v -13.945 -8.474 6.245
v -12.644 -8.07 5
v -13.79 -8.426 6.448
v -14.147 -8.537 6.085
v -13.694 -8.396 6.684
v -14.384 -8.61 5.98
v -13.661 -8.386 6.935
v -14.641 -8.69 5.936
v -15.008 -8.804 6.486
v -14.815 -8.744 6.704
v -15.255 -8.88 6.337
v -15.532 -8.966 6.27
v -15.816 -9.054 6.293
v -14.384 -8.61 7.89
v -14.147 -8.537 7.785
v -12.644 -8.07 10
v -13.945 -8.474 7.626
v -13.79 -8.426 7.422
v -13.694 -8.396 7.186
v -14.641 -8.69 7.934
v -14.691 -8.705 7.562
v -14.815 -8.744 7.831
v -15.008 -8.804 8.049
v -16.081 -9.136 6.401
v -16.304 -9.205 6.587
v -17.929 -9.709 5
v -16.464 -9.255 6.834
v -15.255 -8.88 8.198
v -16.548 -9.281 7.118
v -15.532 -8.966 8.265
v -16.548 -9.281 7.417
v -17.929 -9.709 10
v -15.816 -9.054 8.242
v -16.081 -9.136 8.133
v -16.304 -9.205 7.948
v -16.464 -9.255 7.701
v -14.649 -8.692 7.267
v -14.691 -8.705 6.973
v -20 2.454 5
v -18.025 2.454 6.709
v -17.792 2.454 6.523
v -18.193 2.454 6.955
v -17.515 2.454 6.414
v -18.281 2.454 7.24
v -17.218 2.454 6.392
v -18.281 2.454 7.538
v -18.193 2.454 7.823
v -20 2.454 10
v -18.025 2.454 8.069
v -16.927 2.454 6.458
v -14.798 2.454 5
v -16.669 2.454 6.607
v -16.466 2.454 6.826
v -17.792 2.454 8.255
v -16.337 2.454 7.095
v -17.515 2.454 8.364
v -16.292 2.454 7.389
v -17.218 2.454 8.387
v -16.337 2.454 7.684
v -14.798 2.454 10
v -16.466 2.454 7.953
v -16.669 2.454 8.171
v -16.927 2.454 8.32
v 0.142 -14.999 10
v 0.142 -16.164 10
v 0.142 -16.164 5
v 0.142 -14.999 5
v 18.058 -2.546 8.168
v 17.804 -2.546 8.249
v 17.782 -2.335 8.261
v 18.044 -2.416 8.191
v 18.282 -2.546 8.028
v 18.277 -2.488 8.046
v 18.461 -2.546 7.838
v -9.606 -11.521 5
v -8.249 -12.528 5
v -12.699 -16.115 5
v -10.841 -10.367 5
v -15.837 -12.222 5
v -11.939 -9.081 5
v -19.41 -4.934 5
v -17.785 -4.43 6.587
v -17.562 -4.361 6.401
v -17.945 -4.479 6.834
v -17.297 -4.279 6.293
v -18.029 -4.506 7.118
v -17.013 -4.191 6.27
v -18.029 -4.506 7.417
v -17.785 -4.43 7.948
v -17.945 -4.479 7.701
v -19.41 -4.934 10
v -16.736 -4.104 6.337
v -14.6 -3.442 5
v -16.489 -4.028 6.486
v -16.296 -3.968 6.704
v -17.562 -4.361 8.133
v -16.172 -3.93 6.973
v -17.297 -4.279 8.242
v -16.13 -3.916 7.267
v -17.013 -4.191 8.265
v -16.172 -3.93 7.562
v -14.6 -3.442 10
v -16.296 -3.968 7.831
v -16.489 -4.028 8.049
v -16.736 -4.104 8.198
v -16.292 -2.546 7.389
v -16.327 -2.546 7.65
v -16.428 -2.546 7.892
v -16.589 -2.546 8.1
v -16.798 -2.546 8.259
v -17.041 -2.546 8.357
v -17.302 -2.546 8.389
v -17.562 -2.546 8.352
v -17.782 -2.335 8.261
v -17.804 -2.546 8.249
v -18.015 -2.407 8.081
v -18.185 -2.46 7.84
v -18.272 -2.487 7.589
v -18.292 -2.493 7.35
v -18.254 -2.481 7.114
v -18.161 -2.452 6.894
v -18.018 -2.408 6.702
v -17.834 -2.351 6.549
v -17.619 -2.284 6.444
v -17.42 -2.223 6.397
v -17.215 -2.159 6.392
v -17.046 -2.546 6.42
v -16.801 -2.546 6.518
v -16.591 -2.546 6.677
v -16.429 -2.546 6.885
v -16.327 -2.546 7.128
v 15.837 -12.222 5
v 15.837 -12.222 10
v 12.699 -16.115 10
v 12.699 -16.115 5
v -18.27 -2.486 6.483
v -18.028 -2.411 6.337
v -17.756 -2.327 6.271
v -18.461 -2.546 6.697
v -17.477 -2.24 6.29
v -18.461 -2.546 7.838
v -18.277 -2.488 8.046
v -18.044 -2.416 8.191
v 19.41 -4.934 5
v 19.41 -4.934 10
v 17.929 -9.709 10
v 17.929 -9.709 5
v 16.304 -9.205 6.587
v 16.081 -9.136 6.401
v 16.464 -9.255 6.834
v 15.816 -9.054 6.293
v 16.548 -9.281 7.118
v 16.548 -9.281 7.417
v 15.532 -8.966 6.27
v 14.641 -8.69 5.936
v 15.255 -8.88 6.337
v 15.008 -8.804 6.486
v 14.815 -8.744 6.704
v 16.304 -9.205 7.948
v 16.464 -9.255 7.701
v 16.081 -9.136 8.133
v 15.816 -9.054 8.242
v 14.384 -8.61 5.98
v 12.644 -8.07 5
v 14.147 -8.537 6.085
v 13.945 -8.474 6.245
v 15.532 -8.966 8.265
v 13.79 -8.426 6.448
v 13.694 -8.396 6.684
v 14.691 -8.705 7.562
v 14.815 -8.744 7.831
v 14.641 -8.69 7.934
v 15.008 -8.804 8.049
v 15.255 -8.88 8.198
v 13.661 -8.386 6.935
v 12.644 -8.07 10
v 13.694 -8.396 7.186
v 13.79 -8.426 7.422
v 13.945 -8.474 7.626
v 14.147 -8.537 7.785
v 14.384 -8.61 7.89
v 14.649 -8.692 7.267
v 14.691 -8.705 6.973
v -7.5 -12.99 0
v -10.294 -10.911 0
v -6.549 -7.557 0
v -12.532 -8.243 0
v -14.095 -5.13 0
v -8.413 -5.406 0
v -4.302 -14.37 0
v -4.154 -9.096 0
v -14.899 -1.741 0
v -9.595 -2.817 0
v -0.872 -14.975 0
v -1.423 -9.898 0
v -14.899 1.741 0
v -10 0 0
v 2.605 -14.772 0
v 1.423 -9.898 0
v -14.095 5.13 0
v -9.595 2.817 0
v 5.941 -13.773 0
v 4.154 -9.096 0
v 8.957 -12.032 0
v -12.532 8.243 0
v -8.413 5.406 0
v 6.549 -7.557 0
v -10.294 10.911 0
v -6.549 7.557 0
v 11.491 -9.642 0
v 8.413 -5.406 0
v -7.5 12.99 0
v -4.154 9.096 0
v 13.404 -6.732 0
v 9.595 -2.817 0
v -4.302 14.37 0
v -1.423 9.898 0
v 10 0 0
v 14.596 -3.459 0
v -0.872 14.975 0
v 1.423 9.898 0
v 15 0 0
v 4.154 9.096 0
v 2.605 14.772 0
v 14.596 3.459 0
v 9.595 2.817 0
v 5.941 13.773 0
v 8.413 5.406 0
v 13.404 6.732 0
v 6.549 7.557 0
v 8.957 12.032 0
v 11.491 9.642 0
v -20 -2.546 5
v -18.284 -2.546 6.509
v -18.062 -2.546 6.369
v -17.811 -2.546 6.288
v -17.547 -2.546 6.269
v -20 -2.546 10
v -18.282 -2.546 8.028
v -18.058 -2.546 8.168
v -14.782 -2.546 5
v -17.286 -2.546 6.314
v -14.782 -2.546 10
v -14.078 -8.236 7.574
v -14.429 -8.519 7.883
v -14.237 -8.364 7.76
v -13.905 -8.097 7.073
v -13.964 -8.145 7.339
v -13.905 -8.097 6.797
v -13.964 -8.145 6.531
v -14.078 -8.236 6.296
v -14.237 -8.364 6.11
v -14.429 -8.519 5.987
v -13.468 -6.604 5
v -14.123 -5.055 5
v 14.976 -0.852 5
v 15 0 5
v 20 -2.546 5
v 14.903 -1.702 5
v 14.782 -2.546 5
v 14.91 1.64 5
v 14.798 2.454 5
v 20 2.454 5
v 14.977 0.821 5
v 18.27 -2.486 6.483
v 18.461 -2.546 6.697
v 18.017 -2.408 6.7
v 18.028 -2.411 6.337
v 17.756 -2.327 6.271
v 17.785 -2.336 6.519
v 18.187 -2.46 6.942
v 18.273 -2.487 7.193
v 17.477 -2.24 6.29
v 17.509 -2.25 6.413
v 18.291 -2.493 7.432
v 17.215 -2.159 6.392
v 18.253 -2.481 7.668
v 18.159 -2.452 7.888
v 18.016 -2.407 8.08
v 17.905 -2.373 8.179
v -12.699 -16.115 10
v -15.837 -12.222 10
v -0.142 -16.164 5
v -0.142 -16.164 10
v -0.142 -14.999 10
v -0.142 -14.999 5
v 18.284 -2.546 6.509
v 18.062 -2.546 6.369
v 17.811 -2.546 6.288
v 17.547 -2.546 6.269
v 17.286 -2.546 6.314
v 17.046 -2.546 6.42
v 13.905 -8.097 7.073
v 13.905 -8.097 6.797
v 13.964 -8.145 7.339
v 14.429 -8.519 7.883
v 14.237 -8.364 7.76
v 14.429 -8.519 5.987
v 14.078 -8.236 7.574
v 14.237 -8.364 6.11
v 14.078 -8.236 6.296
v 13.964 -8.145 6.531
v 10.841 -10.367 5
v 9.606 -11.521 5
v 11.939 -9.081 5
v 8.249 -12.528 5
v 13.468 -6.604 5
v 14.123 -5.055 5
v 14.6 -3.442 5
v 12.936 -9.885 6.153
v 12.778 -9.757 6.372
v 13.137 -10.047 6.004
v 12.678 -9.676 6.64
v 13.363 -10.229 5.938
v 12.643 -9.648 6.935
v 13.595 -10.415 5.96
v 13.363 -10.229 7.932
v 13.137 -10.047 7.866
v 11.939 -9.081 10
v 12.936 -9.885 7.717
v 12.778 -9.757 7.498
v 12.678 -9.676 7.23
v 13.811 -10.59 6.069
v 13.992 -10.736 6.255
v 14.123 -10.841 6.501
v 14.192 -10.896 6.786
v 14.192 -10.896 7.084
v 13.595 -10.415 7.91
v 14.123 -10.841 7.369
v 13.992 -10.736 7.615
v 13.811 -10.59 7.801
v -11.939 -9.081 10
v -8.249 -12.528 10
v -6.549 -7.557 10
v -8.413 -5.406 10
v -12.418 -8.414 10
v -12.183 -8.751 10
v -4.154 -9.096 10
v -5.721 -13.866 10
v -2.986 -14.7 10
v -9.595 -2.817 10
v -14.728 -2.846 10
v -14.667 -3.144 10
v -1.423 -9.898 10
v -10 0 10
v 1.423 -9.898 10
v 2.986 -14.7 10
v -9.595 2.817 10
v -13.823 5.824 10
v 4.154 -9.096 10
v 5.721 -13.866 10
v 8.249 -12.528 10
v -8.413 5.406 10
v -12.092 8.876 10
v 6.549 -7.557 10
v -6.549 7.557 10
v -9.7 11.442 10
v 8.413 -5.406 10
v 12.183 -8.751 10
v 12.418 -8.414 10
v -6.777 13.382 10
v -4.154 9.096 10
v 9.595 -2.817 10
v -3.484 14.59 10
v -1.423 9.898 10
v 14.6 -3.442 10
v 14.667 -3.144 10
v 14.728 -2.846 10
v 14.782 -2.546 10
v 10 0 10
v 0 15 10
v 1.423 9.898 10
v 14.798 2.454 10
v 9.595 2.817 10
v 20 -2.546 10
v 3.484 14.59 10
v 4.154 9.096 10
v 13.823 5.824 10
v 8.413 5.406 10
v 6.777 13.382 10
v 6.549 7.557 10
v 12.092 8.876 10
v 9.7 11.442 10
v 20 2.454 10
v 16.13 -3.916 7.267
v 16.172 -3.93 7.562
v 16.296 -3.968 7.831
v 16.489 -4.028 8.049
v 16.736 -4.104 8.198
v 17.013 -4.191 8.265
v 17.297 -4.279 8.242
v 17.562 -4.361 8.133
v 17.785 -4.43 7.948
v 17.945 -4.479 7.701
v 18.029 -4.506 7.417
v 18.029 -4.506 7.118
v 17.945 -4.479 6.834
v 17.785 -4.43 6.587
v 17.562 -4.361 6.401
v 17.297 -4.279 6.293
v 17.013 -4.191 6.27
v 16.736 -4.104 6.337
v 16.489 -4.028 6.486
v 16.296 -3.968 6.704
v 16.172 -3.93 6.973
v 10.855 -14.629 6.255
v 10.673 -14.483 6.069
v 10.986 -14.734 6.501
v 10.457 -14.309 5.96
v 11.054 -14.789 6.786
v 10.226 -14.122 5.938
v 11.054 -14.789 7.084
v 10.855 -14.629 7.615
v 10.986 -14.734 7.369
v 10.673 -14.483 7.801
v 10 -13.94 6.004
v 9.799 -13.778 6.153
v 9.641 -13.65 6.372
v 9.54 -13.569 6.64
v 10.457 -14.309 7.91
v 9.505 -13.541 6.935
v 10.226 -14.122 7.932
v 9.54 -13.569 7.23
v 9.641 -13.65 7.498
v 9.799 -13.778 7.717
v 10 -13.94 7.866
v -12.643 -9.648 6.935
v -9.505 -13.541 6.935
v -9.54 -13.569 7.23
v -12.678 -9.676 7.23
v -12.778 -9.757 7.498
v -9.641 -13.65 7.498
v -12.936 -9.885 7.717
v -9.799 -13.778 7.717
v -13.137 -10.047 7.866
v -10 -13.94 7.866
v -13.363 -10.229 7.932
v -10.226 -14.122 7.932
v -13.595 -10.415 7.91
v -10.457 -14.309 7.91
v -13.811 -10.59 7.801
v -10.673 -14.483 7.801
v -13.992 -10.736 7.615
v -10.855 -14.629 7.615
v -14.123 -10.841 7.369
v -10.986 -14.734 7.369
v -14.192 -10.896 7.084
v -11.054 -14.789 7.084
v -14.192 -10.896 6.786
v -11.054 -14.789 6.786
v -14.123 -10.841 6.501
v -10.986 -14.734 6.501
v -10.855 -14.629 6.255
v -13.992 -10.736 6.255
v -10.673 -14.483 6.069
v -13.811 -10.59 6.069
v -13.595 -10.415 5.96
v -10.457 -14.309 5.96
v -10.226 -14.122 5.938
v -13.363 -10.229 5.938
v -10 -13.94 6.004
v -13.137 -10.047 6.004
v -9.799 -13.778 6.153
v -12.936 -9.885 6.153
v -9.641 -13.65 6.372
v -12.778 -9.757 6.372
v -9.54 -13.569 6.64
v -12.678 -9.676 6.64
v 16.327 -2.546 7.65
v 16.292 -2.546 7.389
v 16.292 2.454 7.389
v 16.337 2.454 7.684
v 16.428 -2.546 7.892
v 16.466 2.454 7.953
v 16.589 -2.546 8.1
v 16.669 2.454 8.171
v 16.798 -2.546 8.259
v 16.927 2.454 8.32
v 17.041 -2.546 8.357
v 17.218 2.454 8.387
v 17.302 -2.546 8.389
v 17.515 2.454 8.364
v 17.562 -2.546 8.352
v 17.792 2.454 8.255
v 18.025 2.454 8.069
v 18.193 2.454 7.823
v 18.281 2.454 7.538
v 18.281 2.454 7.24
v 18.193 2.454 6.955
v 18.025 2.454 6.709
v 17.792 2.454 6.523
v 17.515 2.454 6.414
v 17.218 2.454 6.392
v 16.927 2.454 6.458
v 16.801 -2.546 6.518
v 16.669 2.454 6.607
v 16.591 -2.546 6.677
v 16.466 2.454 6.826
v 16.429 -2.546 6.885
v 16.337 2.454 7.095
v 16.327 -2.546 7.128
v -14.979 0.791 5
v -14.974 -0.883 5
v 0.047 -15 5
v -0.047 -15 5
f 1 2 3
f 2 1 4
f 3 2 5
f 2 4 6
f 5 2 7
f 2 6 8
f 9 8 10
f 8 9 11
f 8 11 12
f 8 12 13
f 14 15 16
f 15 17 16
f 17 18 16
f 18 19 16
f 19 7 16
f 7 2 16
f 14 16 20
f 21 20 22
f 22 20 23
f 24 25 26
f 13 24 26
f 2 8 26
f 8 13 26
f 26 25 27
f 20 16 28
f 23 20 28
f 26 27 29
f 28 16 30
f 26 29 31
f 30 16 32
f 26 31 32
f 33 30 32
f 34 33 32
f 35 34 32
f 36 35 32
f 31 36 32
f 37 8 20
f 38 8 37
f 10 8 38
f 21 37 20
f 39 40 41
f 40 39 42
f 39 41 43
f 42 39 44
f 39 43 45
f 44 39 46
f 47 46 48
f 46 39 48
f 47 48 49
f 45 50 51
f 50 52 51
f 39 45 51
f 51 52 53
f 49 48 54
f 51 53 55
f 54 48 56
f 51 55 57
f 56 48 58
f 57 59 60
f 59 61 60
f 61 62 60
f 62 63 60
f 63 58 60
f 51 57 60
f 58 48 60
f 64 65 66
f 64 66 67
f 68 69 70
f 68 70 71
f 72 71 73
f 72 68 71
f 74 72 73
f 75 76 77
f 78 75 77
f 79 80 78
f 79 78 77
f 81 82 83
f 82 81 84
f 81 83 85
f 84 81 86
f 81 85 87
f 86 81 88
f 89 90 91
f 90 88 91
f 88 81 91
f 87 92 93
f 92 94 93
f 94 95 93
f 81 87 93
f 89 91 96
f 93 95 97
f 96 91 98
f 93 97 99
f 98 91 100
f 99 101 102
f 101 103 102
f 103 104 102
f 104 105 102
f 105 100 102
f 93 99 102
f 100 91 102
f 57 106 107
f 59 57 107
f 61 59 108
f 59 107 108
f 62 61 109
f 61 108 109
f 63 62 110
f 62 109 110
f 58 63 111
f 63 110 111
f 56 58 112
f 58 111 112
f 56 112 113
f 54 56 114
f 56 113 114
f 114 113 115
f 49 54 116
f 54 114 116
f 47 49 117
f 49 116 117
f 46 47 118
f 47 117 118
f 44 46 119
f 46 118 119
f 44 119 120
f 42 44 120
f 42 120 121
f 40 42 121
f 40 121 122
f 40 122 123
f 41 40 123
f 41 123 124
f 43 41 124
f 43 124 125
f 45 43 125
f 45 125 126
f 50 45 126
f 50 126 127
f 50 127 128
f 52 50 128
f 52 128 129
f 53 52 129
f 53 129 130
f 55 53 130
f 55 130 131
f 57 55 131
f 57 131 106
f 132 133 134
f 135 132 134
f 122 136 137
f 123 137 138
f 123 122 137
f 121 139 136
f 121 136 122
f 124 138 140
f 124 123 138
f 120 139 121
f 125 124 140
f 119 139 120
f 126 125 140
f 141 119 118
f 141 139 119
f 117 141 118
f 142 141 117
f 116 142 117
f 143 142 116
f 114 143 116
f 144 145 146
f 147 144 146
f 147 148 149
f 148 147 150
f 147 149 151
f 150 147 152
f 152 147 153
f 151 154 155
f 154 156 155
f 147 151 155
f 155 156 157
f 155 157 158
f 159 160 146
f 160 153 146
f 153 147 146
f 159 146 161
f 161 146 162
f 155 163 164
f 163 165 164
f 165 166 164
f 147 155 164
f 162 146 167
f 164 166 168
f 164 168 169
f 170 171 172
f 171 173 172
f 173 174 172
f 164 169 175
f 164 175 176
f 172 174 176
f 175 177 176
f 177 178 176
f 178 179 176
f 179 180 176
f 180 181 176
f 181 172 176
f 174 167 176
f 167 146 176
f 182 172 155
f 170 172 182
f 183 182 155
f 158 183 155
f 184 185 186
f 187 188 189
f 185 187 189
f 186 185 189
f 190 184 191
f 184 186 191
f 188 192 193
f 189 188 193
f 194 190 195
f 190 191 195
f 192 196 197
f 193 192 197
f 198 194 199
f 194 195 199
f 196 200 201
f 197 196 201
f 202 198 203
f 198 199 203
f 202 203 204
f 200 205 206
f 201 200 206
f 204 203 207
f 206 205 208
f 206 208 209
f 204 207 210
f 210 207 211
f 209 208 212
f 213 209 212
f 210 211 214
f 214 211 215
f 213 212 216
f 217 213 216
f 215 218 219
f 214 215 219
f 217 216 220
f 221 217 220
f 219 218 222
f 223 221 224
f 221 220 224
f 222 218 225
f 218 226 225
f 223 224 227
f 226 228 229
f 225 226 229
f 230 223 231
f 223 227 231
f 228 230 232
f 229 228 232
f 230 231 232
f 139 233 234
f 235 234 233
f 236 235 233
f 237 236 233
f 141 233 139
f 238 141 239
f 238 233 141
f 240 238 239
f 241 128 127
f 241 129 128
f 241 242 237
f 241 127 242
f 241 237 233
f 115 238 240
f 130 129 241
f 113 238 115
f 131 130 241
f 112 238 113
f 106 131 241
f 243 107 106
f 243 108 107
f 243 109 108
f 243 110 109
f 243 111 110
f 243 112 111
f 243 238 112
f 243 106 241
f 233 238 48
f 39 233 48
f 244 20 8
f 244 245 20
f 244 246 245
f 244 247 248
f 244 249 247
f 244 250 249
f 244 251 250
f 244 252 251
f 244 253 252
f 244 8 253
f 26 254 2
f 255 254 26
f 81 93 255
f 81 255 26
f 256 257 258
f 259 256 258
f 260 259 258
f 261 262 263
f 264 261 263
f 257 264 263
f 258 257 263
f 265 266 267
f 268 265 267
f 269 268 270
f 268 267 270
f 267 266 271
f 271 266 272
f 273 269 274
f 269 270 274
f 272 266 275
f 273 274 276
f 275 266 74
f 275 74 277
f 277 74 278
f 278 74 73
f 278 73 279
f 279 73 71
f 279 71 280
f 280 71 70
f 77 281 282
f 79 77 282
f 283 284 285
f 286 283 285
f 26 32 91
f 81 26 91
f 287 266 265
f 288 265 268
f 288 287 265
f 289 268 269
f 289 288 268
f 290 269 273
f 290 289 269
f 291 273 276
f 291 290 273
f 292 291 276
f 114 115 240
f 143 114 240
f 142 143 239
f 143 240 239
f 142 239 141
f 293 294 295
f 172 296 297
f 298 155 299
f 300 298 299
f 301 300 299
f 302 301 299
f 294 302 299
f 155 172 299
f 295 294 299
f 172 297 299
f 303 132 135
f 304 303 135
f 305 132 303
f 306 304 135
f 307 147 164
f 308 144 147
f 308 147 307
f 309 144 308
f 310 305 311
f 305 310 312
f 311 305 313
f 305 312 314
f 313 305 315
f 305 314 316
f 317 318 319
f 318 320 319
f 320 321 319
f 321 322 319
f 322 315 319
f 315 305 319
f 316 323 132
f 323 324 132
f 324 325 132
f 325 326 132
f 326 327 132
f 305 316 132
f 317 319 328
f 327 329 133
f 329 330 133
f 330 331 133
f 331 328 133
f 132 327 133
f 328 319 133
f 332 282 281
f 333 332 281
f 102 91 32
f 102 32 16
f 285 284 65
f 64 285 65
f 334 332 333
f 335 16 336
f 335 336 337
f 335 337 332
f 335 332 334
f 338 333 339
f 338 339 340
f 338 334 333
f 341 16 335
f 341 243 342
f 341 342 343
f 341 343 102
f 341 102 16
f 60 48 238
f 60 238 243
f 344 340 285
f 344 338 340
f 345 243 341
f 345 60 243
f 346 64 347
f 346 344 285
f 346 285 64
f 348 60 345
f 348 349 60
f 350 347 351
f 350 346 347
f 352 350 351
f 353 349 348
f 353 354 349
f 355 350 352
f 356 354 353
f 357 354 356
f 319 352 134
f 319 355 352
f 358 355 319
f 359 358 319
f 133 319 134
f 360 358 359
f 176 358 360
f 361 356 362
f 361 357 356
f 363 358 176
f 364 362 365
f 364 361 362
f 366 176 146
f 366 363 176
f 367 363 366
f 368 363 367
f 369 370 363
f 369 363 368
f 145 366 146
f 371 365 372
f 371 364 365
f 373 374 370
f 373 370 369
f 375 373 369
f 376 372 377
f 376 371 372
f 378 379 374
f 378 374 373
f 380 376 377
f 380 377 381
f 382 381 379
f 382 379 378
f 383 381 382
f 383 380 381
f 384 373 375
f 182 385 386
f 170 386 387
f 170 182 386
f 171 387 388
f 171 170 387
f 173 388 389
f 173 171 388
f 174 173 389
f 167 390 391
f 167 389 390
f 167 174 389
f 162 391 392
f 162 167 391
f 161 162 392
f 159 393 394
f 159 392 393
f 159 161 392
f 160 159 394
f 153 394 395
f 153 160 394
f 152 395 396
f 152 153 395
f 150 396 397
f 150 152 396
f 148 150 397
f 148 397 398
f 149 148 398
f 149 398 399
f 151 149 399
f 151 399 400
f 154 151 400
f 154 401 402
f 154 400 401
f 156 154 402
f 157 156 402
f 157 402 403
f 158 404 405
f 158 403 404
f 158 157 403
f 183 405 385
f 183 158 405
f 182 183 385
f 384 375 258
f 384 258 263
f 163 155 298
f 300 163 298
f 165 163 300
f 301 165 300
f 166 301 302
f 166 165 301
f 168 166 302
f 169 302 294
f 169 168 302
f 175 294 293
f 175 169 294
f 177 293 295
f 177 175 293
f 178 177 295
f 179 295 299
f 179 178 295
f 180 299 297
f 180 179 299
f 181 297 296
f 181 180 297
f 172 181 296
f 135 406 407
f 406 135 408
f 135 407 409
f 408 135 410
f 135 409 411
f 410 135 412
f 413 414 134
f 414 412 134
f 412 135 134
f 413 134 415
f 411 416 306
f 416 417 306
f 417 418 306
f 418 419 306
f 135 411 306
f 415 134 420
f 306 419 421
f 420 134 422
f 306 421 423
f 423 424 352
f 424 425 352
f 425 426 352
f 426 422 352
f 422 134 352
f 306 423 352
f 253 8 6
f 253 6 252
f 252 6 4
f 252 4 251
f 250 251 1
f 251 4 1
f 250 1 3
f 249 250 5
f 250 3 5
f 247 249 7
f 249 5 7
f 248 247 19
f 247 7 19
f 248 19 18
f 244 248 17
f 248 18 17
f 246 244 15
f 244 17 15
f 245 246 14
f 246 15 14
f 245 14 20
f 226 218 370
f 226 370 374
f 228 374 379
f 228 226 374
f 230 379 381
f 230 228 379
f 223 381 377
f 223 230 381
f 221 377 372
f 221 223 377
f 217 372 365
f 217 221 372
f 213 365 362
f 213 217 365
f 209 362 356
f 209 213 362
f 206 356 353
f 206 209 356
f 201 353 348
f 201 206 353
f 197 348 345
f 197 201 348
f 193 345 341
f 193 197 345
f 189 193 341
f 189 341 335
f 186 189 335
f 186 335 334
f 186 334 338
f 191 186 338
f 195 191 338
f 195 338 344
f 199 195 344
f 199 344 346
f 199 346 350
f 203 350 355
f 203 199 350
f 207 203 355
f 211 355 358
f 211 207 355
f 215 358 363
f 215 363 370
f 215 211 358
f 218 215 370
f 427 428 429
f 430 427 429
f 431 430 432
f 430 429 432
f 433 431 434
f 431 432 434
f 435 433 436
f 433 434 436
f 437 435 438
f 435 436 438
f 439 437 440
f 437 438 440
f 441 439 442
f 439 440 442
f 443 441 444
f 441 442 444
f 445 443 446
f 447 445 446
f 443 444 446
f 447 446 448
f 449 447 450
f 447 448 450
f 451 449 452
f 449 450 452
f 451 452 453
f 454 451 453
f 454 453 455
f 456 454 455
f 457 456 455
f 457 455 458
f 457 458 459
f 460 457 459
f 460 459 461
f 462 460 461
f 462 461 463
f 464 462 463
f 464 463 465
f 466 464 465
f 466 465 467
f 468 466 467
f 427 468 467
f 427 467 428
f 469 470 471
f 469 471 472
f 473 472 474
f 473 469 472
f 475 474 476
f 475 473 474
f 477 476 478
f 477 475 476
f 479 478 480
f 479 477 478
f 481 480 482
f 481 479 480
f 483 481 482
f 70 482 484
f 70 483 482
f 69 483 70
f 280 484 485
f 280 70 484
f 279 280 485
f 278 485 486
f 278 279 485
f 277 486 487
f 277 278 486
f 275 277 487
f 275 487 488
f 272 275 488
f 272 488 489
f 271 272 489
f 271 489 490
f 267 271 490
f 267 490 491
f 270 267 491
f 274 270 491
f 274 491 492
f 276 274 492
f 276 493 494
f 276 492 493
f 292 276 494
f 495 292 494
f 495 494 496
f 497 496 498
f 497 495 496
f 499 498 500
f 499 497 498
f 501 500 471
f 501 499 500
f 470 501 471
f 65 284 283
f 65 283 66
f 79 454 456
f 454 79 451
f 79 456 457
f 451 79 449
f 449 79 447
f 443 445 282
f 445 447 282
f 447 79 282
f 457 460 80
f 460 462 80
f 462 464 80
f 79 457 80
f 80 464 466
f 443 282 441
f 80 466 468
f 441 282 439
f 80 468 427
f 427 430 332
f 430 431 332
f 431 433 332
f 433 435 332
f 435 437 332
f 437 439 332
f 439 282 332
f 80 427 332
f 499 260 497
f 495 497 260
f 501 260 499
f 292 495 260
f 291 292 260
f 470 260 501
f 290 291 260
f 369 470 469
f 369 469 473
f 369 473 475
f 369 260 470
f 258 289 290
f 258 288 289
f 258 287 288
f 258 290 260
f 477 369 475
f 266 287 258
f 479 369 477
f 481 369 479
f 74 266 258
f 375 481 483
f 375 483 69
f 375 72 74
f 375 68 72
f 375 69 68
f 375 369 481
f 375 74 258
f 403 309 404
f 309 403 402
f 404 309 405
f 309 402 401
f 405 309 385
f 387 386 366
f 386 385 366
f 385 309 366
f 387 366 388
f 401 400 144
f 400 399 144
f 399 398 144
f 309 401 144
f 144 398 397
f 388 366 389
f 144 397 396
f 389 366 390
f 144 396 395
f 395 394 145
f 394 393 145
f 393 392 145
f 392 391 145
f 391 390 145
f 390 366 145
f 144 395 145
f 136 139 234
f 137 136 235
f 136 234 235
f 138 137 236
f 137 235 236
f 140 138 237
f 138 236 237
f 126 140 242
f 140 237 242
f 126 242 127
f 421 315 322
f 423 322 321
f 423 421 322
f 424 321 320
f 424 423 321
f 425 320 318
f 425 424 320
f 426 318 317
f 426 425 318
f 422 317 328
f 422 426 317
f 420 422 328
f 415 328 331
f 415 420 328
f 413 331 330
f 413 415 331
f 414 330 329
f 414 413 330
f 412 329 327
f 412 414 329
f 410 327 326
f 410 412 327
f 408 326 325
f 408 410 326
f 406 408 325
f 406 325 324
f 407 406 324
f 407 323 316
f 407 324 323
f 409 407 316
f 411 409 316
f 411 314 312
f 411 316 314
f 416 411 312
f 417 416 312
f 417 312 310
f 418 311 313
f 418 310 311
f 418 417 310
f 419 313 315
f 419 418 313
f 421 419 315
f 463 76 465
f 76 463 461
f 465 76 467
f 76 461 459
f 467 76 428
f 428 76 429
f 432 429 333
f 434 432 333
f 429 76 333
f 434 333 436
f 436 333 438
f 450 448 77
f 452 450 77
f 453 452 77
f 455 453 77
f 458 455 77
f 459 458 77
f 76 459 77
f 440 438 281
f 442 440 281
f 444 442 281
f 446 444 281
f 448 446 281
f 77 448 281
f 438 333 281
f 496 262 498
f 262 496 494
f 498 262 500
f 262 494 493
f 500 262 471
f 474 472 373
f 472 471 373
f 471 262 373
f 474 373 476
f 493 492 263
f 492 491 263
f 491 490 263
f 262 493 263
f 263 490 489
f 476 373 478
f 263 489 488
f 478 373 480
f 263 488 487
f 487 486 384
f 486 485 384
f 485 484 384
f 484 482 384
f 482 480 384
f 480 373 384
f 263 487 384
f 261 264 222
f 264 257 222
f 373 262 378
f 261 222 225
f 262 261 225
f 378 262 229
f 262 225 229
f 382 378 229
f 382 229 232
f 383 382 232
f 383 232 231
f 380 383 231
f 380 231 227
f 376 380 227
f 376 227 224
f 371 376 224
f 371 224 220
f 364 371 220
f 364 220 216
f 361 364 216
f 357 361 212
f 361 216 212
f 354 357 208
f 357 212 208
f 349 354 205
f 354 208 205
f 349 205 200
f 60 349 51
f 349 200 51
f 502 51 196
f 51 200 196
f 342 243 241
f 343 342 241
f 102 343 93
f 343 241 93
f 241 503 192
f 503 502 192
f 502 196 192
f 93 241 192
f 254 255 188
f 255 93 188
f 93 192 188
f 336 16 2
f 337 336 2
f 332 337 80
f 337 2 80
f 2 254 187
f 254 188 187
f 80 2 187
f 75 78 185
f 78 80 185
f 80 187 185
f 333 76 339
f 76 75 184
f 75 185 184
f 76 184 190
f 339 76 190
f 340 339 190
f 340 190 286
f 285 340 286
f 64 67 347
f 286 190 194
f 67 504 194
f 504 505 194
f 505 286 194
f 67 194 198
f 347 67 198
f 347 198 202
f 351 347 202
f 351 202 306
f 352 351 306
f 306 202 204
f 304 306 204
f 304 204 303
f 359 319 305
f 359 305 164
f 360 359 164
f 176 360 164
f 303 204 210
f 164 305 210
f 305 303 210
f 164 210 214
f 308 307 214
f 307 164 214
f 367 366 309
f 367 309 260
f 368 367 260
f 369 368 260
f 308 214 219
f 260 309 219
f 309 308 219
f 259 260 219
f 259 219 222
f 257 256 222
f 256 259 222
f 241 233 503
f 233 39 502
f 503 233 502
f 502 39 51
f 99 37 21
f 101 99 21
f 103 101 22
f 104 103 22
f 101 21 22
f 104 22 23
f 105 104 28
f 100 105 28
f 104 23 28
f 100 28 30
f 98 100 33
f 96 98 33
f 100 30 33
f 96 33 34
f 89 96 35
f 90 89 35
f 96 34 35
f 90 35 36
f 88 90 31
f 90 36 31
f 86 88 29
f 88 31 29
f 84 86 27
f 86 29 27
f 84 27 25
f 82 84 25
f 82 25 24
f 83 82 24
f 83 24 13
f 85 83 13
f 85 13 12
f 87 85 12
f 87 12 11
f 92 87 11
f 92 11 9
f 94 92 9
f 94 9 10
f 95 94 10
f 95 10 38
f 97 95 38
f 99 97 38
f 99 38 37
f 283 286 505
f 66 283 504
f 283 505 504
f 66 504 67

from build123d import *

# Parameters (mm, degrees)
ESQUISSE1_R             = 15
ESQUISSE1_R_2           = 10
BOSS_EXTRU_1_DEPTH      = 10
ESQUISSE2_W             = 7
ESQUISSE2_H             = 5
ESQUISSE2_W_2           = 0.284758048
ESQUISSE2_H_2           = 1.526135502
BOSS_EXTRU_2_DEPTH      = 5
ESQUISSE3_R             = 1
ENL_V_MAT_EXTRU_1_DEPTH = 10
ESQUISSE4_R             = 1
ENL_V_MAT_EXTRU_2_DEPTH = 7
ESQUISSE5_R             = 1
ENL_V_MAT_EXTRU_3_DEPTH = 7


with BuildPart() as part:
    # Esquisse1 → Boss.-Extru.1 (new body)
    with BuildSketch(Plane.XY):
        Circle(ESQUISSE1_R)
        Circle(ESQUISSE1_R_2, mode=Mode.SUBTRACT)
    extrude(amount=BOSS_EXTRU_1_DEPTH)

    # Esquisse2 → Boss.-Extru.2 (add)
    with BuildSketch(Plane.XY.offset(10)):
        with Locations((-16.5, -0.045599179)):
            Rectangle(ESQUISSE2_W, ESQUISSE2_H)
        Polygon((-12.723746603, -2.860261308), (-11.24279347, -7.635905538), (-17.928695393, -9.709239924), (-19.409648526, -4.933595693), align=None)
        Polygon((-10.38626352, -7.829614824), (-7.248762671, -11.722696948), (-12.699077643, -16.115198137), (-15.836578493, -12.222116013), align=None)
        Polygon((15.836578493, -12.222116013), (12.699077643, -16.115198137), (7.248762671, -11.722696948), (10.38626352, -7.829614824), align=None)
        Polygon((19.409648526, -4.933595693), (17.928695393, -9.709239924), (11.24279347, -7.635905538), (12.723746603, -2.860261308), align=None)
        with Locations((16.5, -0.045599179)):
            Rectangle(ESQUISSE2_W, ESQUISSE2_H)
        with Locations((0, -15.401311239)):
            Rectangle(ESQUISSE2_W_2, ESQUISSE2_H_2)
    extrude(amount=-BOSS_EXTRU_2_DEPTH)

    # Esquisse3 → Enlèv. mat.-Extru.1 (cut)
    with BuildSketch(Plane.XZ.offset(2.545599179)):
        with Locations((-17.292317554, 7.389299581)):
            Circle(ESQUISSE3_R)
    enl_v_mat_extru_1 = extrude(amount=-ENL_V_MAT_EXTRU_1_DEPTH, mode=Mode.SUBTRACT)

    # Esquisse4 → Enlèv. mat.-Extru.2 (cut)
    with BuildSketch(Plane(origin=(1.17388153, -3.785427393, 0), x_dir=(0.955128846150379, 0.2961906265421742, 0), z_dir=(0.2961906265421742, -0.955128846150379, 0))):
        with Locations((-17.565905228, 7.267460252)):
            Circle(ESQUISSE4_R)
    enl_v_mat_extru_2 = extrude(amount=-ENL_V_MAT_EXTRU_2_DEPTH, mode=Mode.SUBTRACT)

    # Esquisse5 → Enlèv. mat.-Extru.3 (cut)
    with BuildSketch(Plane(origin=(2.873250851, -3.56519474, 0), x_dir=(0.778616424708494, 0.6275001698598672, 0), z_dir=(0.6275001698598671, -0.7786164247084939, 0))):
        with Locations((-16.898350616, 6.935079558)):
            Circle(ESQUISSE5_R)
    enl_v_mat_extru_3 = extrude(amount=-ENL_V_MAT_EXTRU_3_DEPTH, mode=Mode.SUBTRACT)

    # Symétrie1: Enlèv. mat.-Extru.1, Enlèv. mat.-Extru.2, Enlèv. mat.-Extru.3 across plane
    add(enl_v_mat_extru_1.mirror(Plane(origin=(0, 0, 0), x_dir=(0, 0, 1), z_dir=(1, 0, 0))), mode=Mode.SUBTRACT)
    add(enl_v_mat_extru_2.mirror(Plane(origin=(0, 0, 0), x_dir=(0, 0, 1), z_dir=(1, 0, 0))), mode=Mode.SUBTRACT)
    add(enl_v_mat_extru_3.mirror(Plane(origin=(0, 0, 0), x_dir=(0, 0, 1), z_dir=(1, 0, 0))), mode=Mode.SUBTRACT)


solid = part.part
